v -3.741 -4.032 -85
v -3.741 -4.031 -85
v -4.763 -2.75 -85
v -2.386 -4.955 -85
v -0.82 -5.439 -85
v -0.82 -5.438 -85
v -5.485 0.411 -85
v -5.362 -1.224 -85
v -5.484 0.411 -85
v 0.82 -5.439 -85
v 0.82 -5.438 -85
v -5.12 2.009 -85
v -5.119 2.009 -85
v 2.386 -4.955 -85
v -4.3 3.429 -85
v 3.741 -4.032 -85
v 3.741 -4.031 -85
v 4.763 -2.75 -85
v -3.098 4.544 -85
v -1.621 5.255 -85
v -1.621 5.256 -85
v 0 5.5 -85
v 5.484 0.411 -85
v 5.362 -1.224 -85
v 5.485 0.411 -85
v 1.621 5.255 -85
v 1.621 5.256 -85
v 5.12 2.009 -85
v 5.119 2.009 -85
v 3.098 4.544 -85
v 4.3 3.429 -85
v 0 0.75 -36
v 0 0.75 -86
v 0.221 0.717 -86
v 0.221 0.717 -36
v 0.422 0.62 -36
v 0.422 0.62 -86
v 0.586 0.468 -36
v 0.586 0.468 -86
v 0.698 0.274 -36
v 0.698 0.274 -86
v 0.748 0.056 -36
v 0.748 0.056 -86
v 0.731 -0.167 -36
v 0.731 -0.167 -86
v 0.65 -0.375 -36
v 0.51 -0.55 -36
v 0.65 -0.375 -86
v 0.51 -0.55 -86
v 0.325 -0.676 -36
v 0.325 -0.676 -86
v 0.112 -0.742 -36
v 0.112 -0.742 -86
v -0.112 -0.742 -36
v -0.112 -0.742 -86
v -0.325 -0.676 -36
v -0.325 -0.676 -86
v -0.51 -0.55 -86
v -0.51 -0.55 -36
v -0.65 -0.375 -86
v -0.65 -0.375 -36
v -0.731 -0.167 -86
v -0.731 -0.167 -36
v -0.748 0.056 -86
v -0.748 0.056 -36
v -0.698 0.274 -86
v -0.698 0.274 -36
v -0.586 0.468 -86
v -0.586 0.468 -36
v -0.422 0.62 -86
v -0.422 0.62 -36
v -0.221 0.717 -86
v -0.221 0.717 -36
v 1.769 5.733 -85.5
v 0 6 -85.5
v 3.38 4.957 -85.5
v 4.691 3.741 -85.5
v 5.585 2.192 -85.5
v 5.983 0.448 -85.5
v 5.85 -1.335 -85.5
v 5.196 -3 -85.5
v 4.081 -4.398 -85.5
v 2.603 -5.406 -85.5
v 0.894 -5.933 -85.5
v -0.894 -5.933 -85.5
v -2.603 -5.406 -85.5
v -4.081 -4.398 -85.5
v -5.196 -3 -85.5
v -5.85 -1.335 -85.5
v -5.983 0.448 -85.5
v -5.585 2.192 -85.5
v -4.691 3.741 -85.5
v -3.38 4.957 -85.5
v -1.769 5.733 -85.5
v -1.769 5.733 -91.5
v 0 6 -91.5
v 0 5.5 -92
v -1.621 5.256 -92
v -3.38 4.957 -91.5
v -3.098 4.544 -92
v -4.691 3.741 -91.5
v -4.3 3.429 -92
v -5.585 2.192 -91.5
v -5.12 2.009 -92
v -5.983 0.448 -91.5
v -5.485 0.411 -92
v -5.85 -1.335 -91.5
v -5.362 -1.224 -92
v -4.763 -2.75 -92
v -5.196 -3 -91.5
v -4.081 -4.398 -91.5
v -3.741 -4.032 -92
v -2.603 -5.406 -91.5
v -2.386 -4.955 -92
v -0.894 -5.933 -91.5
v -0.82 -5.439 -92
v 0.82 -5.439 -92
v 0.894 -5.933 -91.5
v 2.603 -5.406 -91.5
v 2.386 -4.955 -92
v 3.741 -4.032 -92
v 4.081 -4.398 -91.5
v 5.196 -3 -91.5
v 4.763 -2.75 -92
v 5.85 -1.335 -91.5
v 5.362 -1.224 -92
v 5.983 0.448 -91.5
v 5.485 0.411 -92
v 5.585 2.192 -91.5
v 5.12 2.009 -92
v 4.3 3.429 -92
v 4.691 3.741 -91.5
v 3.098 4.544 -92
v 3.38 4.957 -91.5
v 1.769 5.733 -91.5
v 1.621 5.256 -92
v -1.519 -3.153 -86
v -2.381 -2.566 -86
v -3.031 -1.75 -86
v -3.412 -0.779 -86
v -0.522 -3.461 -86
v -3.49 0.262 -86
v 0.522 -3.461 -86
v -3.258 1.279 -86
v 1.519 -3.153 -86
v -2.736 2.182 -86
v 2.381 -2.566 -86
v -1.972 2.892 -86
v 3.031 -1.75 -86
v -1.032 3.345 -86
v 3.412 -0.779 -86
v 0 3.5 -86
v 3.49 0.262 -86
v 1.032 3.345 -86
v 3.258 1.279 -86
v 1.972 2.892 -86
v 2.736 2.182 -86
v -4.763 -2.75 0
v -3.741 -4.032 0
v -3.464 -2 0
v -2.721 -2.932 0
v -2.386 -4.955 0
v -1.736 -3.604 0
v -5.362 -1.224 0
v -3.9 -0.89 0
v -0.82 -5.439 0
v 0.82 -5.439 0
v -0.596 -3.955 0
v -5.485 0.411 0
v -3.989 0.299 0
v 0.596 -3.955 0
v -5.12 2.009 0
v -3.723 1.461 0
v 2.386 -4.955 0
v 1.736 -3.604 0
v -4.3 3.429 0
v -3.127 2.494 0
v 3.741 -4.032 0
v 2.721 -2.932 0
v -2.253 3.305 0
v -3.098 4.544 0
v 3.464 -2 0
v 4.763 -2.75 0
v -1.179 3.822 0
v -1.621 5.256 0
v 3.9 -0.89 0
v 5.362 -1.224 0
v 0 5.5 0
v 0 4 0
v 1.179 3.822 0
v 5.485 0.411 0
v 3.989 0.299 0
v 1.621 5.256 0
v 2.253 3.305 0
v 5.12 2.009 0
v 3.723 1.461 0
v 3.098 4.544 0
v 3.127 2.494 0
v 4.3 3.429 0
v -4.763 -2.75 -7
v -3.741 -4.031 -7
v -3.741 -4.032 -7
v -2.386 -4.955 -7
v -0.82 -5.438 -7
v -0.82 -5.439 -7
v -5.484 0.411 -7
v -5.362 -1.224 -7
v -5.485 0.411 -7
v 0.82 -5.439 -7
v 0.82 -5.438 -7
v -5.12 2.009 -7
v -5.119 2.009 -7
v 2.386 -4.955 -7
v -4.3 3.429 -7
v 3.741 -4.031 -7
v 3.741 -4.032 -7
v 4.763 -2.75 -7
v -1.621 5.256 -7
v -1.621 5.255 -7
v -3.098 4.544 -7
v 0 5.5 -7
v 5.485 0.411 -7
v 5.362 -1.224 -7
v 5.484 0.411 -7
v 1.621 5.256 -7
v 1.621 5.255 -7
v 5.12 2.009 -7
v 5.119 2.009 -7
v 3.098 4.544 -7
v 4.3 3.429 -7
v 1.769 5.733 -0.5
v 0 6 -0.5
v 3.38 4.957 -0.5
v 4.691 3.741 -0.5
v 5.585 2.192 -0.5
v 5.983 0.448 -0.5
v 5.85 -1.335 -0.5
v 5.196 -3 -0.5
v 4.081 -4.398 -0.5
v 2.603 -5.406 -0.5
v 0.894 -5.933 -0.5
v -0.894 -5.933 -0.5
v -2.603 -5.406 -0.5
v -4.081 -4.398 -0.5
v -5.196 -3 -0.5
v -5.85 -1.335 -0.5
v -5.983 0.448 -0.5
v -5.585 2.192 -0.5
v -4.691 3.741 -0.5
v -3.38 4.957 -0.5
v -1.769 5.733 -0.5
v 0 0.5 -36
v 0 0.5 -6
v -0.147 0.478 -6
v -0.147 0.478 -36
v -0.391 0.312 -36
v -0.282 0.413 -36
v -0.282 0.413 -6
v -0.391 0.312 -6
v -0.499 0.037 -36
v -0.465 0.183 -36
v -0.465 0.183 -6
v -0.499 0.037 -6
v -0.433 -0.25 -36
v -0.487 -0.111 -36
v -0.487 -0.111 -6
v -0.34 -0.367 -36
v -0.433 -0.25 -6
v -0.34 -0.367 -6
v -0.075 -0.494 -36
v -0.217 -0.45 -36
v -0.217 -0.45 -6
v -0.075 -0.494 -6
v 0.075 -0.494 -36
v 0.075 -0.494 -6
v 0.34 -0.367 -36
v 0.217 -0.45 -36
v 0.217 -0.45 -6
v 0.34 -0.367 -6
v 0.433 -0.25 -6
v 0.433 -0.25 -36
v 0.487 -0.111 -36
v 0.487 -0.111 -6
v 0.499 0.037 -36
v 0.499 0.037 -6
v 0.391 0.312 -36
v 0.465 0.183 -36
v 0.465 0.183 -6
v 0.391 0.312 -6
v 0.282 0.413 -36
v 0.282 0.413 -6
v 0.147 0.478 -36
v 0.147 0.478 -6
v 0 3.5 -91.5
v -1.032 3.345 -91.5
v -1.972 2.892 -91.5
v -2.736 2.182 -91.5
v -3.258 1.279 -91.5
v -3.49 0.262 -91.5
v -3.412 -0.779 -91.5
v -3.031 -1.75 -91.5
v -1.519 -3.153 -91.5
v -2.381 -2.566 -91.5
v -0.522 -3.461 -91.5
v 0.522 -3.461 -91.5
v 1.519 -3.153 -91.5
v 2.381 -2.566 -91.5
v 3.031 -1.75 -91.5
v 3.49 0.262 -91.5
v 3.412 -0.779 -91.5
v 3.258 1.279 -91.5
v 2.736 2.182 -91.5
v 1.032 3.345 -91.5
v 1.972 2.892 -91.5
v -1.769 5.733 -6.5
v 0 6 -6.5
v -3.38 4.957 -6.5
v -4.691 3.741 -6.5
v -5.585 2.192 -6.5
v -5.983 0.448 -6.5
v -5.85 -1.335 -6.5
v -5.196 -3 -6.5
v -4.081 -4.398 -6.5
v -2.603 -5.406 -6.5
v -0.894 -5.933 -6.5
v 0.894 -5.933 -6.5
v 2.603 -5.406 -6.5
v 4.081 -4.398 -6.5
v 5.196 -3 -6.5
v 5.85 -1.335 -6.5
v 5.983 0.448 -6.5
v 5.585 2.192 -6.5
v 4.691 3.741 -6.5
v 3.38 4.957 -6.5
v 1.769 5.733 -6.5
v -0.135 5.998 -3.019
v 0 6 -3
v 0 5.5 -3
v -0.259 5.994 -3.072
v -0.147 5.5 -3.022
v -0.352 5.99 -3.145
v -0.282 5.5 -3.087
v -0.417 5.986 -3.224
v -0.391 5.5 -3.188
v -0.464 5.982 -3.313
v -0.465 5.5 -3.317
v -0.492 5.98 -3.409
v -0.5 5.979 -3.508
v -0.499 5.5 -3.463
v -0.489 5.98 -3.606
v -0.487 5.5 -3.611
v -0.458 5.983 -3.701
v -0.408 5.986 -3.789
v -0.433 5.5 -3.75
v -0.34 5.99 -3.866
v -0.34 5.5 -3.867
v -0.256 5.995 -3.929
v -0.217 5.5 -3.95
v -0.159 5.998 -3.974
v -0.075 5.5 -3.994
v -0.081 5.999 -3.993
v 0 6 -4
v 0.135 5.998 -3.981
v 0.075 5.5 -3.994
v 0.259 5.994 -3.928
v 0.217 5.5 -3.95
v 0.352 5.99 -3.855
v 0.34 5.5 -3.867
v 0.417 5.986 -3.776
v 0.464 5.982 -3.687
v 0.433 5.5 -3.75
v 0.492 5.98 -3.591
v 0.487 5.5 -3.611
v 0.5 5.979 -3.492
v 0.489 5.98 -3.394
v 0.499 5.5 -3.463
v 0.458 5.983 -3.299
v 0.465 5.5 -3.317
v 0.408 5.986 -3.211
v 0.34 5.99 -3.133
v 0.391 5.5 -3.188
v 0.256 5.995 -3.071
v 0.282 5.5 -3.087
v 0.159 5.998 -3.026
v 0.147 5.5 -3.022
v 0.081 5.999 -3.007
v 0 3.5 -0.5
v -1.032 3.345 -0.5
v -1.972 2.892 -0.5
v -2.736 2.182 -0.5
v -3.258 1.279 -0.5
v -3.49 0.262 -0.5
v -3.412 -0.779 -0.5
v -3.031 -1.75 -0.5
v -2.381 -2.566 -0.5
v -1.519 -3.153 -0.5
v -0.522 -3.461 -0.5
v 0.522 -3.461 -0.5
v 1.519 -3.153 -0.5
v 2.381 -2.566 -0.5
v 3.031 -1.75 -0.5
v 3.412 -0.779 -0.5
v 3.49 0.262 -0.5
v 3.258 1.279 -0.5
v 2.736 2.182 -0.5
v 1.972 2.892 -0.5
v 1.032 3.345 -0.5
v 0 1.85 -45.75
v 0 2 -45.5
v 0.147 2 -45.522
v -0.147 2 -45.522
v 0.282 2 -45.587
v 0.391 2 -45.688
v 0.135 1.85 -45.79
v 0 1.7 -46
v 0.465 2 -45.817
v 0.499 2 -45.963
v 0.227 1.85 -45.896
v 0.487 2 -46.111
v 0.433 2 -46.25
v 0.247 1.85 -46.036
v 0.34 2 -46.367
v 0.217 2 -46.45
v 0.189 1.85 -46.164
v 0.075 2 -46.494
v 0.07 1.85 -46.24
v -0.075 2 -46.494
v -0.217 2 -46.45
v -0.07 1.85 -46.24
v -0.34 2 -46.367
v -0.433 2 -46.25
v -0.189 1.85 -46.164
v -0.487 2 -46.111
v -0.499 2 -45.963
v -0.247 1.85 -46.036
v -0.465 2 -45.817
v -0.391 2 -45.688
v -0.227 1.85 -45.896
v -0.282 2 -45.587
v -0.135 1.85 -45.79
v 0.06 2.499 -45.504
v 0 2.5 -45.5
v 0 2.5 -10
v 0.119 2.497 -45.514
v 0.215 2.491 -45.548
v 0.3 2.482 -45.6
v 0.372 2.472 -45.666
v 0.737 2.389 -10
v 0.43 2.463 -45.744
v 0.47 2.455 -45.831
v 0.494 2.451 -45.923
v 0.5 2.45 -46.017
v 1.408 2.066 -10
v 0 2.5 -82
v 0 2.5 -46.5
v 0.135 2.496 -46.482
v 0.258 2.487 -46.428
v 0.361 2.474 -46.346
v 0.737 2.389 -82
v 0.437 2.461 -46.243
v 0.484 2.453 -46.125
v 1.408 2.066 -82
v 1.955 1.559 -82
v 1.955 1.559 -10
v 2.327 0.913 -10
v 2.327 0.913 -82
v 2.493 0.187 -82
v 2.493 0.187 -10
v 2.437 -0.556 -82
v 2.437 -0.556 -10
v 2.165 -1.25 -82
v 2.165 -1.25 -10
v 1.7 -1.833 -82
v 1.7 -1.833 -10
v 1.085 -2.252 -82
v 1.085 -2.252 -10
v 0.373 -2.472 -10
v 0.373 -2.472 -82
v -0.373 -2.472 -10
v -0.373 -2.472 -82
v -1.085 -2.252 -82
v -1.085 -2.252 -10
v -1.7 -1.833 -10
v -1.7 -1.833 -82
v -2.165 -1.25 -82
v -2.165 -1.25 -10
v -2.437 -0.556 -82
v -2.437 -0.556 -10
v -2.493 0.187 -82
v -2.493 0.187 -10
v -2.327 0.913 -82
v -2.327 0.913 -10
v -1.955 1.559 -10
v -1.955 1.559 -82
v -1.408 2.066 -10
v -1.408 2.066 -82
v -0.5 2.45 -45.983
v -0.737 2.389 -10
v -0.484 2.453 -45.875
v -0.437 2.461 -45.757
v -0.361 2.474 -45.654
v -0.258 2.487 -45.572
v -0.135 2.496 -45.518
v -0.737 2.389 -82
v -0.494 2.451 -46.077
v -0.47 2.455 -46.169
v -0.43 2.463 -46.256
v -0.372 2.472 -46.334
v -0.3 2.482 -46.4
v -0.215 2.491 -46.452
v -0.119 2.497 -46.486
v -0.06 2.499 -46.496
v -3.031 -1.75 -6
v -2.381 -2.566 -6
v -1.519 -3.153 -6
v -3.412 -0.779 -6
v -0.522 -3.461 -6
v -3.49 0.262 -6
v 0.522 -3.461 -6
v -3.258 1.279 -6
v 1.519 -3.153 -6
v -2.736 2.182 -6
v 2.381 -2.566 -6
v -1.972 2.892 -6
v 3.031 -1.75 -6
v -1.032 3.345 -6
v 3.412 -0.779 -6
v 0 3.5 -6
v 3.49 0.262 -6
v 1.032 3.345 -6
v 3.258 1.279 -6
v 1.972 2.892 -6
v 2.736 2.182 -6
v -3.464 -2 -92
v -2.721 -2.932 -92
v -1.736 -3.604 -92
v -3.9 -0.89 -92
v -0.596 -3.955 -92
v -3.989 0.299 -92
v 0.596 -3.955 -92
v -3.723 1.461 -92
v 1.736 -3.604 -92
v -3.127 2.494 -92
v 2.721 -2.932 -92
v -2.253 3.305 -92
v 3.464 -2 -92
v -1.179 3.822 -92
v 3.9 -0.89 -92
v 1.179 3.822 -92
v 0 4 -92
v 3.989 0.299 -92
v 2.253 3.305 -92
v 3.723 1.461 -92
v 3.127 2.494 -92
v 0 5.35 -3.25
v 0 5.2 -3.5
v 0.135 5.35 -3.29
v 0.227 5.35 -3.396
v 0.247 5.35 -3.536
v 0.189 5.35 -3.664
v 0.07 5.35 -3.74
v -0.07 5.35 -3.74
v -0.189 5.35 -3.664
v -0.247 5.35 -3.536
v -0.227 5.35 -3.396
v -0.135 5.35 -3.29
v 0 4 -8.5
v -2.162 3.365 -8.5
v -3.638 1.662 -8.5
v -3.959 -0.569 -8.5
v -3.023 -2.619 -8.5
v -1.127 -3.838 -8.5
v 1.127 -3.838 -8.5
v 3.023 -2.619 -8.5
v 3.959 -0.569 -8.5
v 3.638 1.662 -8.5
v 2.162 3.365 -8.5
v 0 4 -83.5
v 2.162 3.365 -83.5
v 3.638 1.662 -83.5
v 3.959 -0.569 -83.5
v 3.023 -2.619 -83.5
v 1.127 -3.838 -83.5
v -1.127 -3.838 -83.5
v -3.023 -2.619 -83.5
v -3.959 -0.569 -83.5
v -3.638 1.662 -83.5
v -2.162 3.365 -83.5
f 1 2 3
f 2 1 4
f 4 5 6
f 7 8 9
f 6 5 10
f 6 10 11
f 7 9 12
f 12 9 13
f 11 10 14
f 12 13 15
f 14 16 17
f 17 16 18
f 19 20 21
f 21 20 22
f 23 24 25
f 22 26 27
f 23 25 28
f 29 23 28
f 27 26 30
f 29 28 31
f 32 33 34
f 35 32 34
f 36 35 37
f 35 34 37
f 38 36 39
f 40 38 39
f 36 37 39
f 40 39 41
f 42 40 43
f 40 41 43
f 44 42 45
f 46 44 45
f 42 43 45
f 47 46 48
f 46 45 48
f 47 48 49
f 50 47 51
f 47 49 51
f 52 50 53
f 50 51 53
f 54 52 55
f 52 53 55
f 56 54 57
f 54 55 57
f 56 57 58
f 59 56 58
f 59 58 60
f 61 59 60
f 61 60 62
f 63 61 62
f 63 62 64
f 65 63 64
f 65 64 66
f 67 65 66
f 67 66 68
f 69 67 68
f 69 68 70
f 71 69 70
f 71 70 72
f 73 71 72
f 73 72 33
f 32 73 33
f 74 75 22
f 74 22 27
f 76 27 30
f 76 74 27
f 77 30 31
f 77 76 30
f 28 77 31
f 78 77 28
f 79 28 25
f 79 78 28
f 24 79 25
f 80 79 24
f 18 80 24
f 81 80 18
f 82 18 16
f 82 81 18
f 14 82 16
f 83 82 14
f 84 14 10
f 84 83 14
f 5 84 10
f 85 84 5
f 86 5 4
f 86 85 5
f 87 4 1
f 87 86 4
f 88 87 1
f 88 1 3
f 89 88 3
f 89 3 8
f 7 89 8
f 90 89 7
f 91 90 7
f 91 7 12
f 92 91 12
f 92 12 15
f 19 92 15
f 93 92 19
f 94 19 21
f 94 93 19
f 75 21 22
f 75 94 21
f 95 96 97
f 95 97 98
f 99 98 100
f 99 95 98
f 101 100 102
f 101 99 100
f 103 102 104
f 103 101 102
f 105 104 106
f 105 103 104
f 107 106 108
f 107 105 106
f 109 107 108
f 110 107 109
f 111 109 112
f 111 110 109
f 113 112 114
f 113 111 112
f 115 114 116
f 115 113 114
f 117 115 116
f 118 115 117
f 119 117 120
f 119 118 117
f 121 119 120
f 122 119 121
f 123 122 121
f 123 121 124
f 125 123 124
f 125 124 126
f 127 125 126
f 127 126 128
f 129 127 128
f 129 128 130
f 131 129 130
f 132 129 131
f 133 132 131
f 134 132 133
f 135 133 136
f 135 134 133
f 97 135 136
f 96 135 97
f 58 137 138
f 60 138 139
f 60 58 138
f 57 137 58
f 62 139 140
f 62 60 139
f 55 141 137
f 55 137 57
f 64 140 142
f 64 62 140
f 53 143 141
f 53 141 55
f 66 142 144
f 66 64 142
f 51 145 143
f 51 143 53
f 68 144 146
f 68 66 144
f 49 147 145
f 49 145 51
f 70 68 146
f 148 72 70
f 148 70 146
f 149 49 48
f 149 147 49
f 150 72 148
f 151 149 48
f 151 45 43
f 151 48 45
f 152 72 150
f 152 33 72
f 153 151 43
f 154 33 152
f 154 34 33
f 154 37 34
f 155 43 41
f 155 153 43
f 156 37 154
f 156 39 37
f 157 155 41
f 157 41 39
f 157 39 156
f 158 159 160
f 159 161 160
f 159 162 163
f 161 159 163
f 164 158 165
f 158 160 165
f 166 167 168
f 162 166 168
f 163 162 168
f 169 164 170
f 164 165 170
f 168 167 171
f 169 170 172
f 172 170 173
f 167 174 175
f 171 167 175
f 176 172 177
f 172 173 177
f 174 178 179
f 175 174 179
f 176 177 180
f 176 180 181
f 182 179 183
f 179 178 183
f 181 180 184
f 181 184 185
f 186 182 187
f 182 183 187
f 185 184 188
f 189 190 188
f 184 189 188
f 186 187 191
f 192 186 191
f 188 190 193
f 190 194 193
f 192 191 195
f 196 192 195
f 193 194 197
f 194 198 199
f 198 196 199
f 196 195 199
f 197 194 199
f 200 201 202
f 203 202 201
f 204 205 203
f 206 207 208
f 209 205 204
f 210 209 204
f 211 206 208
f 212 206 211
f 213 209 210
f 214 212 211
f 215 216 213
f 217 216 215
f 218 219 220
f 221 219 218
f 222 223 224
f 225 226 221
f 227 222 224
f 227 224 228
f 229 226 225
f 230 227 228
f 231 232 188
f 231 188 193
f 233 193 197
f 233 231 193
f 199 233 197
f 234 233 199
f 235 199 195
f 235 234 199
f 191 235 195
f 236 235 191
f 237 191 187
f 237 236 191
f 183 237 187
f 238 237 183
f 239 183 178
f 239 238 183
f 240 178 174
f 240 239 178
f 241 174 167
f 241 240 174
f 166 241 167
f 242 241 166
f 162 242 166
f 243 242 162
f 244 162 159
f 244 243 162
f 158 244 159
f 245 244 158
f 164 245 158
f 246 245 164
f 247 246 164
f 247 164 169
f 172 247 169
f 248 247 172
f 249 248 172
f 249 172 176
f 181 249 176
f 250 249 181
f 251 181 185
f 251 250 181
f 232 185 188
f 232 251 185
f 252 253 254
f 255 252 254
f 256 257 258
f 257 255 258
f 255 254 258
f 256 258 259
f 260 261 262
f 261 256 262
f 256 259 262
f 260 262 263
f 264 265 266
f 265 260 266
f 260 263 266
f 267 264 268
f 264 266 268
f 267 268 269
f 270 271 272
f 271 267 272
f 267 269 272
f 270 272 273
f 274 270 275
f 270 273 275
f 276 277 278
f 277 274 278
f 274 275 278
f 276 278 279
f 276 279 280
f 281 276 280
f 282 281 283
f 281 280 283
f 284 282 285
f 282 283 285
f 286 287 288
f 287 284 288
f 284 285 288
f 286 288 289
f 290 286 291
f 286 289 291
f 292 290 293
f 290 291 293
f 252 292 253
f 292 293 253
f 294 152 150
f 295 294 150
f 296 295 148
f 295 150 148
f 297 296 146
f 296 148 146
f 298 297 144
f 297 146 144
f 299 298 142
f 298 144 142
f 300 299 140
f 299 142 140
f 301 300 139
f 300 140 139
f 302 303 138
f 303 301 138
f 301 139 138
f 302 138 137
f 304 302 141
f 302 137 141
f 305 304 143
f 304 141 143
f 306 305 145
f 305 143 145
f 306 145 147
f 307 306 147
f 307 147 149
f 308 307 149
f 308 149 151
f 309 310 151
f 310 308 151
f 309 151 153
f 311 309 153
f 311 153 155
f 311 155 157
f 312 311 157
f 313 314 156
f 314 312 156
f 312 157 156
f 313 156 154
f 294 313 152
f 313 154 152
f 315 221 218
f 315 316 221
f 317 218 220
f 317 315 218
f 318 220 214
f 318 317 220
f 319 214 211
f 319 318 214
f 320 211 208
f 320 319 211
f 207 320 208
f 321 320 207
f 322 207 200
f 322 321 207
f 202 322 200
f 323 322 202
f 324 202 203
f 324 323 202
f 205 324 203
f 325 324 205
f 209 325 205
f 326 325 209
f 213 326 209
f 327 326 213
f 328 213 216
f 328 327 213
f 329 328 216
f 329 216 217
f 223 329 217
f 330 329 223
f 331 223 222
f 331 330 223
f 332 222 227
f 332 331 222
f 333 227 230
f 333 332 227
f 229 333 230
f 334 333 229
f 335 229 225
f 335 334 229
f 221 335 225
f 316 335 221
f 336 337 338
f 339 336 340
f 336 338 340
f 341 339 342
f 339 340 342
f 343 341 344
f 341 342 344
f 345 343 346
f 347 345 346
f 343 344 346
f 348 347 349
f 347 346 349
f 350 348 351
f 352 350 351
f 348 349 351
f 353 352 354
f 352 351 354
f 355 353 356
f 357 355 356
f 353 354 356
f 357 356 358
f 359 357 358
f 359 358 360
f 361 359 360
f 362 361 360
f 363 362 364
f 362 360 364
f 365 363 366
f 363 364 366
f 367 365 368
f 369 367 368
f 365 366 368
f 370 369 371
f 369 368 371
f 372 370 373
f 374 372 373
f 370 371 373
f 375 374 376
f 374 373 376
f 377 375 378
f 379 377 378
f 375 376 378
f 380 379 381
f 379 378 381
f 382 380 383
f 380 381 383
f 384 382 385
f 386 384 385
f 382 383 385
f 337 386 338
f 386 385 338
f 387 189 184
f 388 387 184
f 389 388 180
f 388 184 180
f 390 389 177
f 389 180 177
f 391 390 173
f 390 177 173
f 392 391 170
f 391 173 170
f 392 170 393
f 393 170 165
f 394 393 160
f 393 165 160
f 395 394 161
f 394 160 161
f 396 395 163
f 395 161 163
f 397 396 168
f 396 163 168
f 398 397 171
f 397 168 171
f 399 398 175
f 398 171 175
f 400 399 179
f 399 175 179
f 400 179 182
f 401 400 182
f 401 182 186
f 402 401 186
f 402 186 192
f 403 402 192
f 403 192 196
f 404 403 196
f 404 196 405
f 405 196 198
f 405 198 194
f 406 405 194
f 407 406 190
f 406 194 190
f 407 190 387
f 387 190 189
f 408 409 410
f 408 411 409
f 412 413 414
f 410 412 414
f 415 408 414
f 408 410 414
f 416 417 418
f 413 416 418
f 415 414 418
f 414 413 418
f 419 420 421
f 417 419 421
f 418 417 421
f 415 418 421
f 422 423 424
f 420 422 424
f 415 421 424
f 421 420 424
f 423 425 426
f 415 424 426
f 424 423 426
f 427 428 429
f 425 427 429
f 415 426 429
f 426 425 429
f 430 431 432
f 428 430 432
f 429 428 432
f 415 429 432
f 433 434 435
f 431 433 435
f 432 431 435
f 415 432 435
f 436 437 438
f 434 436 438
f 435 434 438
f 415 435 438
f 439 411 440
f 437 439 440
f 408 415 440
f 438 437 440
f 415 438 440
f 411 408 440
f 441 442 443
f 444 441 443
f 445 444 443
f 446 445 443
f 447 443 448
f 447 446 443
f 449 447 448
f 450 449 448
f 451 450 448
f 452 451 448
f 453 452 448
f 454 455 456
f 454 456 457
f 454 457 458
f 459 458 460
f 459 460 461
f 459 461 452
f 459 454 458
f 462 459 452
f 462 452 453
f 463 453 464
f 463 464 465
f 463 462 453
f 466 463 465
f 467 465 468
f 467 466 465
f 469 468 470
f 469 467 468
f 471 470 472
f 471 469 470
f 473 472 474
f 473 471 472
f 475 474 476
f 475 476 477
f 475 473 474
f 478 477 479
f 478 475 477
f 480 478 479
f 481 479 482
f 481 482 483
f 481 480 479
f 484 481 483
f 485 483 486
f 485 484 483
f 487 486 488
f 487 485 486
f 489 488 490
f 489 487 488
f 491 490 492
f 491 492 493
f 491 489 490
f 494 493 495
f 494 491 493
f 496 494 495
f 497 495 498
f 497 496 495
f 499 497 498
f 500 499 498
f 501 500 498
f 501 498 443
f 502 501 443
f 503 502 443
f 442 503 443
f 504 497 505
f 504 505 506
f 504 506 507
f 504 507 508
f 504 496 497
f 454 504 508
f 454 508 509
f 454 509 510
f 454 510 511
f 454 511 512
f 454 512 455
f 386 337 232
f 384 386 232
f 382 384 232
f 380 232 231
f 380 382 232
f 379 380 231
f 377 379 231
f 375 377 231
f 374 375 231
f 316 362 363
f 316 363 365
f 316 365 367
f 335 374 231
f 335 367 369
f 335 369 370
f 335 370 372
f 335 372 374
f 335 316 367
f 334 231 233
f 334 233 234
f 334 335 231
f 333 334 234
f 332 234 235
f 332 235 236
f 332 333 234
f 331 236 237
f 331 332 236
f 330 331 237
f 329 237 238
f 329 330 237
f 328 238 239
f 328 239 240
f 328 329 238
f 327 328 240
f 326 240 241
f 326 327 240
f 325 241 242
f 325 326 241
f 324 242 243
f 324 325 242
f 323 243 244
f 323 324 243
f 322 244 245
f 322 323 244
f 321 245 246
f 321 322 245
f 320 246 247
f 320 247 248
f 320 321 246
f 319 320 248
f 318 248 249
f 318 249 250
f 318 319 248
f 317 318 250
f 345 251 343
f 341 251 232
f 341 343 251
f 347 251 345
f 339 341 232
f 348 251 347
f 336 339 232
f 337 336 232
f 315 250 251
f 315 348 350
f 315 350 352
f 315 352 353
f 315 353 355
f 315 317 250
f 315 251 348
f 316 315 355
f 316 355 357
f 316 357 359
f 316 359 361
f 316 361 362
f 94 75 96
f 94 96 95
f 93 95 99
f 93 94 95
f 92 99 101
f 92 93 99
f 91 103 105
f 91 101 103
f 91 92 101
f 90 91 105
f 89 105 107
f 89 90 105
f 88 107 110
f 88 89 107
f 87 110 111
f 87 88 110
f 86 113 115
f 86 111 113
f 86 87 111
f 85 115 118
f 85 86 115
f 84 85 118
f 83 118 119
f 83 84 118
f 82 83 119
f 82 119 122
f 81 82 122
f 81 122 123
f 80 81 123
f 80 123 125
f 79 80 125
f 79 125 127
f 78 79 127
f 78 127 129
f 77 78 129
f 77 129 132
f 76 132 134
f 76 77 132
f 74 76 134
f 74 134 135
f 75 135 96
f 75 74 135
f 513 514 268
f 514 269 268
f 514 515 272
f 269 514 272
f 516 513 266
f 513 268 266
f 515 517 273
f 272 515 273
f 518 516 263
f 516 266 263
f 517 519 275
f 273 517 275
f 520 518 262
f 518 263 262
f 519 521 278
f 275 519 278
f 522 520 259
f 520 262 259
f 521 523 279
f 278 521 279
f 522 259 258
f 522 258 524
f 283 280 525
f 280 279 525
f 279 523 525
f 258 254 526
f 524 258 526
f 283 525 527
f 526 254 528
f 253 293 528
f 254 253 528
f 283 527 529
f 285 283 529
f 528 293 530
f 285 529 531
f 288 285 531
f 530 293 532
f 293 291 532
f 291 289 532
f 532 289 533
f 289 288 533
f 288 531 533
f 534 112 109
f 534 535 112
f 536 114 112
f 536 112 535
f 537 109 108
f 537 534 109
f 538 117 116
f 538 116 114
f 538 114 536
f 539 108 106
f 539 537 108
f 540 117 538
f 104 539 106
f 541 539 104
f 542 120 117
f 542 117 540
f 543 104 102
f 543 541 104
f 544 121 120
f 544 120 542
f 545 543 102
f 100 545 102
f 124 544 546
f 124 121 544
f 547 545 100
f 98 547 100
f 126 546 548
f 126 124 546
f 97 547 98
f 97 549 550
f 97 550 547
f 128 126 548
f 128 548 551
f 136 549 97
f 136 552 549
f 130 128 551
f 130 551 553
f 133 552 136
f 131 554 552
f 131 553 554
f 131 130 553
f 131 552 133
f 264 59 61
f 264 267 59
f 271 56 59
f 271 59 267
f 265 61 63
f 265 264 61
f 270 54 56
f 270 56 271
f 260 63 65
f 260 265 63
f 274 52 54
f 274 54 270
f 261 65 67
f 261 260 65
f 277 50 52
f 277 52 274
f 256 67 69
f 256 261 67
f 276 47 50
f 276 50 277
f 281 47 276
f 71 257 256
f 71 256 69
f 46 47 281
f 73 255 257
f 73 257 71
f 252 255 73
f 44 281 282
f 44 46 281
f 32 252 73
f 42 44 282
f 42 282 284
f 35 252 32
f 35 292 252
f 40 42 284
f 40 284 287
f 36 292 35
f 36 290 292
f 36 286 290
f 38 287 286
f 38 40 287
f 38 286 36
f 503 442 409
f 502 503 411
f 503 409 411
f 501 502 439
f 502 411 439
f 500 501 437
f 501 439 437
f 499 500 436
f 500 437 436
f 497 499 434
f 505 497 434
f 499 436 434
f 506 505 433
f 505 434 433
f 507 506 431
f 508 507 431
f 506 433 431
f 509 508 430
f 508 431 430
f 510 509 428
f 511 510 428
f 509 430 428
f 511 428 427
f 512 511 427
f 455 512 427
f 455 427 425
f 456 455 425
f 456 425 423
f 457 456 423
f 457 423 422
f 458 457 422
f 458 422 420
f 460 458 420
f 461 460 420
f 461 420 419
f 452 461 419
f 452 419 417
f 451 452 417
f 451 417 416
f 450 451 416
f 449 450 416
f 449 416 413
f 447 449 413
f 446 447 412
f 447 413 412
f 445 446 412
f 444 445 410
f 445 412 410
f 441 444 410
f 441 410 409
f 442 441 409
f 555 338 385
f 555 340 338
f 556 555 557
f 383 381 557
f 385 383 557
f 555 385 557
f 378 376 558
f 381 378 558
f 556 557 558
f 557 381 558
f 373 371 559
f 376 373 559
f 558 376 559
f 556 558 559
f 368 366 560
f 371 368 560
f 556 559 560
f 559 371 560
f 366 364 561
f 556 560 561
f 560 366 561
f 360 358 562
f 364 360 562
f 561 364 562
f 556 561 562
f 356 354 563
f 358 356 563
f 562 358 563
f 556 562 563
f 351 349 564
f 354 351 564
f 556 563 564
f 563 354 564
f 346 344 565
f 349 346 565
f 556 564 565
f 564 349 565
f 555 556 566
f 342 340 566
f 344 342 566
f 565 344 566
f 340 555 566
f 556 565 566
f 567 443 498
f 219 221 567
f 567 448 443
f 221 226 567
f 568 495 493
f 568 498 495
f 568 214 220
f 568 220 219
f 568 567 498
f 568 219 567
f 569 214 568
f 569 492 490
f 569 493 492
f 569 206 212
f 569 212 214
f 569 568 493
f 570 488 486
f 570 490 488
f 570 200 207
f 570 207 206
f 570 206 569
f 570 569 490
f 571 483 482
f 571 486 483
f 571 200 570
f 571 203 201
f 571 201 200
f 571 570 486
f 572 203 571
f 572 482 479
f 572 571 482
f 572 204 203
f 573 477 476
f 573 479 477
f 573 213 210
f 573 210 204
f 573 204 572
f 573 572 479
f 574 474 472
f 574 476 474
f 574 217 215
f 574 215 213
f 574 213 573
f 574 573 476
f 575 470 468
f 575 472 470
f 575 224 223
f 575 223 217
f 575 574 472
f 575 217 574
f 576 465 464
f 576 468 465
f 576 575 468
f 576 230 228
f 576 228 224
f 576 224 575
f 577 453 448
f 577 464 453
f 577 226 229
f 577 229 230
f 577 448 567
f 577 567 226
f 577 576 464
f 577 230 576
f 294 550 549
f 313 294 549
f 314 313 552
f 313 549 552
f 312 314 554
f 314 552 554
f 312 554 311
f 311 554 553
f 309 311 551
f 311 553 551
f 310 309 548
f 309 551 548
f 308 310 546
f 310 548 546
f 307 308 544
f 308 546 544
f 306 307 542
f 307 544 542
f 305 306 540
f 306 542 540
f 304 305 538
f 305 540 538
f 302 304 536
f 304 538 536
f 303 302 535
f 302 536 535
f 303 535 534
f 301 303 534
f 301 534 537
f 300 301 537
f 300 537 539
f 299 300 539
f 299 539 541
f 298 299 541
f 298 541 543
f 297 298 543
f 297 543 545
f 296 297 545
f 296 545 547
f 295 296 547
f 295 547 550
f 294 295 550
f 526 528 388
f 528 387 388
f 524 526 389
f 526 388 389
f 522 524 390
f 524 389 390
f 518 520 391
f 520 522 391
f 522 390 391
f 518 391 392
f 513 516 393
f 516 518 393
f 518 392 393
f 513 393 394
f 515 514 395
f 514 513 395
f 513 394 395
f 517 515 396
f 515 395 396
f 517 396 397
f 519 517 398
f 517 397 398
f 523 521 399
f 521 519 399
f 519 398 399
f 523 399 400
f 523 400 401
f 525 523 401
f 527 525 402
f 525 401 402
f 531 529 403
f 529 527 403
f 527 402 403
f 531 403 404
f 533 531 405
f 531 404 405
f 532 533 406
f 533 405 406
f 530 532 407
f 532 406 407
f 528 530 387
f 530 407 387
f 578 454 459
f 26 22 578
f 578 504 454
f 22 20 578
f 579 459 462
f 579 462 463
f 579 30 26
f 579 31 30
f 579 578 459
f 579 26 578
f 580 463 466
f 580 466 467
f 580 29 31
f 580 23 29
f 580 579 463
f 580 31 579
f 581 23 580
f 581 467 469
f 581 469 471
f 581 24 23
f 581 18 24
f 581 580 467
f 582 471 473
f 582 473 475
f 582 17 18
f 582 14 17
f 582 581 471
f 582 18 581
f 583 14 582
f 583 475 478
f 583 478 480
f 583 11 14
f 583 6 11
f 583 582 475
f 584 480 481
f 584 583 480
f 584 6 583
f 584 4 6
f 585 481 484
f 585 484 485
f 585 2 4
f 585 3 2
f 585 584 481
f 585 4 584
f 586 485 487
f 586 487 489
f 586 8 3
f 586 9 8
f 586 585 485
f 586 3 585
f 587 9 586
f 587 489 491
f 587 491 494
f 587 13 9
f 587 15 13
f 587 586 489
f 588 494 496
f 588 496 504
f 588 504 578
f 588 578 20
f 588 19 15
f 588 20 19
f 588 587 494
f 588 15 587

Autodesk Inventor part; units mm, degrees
ref_plane "YZ Plane" through (0, 0, 0) normal (1, 0, 0) x (0, 1, 0)
sketch "Sketch1" plane through (0, 0, 0) normal (1, 0, 0) x (0, 1, 0)
  line L0 (0, 0) -> (0, -92)
  line L1 (0, -92) -> (3.5, -92)
  line L2 (3.5, -92) -> (3.5, 0)
  line L3 (3.5, 0) -> (0, 0)
  line L4 (3.5, 0) -> (3.5, -6)
  line L5 (3.5, -92) -> (3.5, -86)
  line L6 (3.5, -92) -> (6, -92)
  line L7 (6, -92) -> (6, -86)
  line L8 (6, -86) -> (3.5, -86)
  line L9 (3.5, 0) -> (6, 0)
  line L10 (6, 0) -> (6, -6)
  line L11 (6, -6) -> (3.5, -6)
  line L12 (3.5, -86) -> (0.5, -86)
  line L13 (0.5, -86) -> (0.5, -6)
  line L14 (0.5, -6) -> (3.5, -6)
  line L15 (6, -6) -> (6, -7)
  line L16 (6, -7) -> (0.5, -7)
  line L17 (6, -86) -> (6, -85)
  line L18 (6, -85) -> (0.5, -85)
  line L19 (3.5, -7) -> (3.6267, -7)
  line L20 (2.5, -7) -> (2.5, -85)
  line L21 (0.5, -6) -> (0.5, -36)
  line L22 (0.5, -36) -> (0.75, -36)
  line L23 (0.75, -36) -> (0.75, -86)
  line L24 (0.75, -86) -> (0, -86)
  point P0 (3.5, -85)
  point P1 (2, -6)
  point P2 (3.6267, -85)
  dimension "d0" = 92
  dimension "d1" = 3.5
  dimension "d2" = 6
  dimension "d3" = 6
  dimension "d5" = 2.5
  dimension "d6" = 2.5
  dimension "d7" = 3
  dimension "d8" = 1
  dimension "d9" = 1
  dimension "d22" = 2
  dimension "d41" = 30
  dimension "d42" = 0.25
  dimension "d43" = 50
revolve "Revolution1" add sketch "Sketch1" angle 360 about axis through (0, 0, 0) along (0, 0, -1) contours L9 L10 L11 L2 | L11 L15 L16 L2 | L2 L16 L13 L14 | L2 L8 L7 L6 | L23 L18 L2 L12 | L2 L18 L17 L8 | L23 L22 L13 L16 L20 L18
thread "Thread1" size "M7x1" class "6H" standard "ANSI Metric M Profile" full length
thread "Thread2" size "M7x1" class "6H" standard "ANSI Metric M Profile" full length
chamfer "Chamfer1" distance 0.5 angle 45 2 edges at (0, -3.5, 0) (0, -3.5, -92)
chamfer "Chamfer2" distance 0.5 angle 45 4 edges at (0, -6, -92) (0, -6, -85) (0, -6, -7) (0, -6, 0)
chamfer "Chamfer3" distance 3 angle 45 2 edges at (0, -2.5, -7) (0, -2.5, -85)
ref_plane "Work Plane1" through (0, 6, -3.5) normal (0, 1, 0) x (-1, 0, 0)
ref_plane "Work Plane2" through (0, 2.5, -46) normal (0, 1, 0) x (-1, 0, 0)
sketch "Sketch2" plane through (0, 6, -3.5) normal (0, 1, 0) x (-1, 0, 0)
  point P0 (0, 3.5)
  point P1 (0, 0)
  point P2 (0, 0)
sketch "Sketch3" plane through (0, 2.5, -46) normal (0, 1, 0) x (-1, 0, 0)
  point P0 (0, 46)
  point P1 (0, 0)
hole "Hole1" at (0, 6, -3.5) direction (0, -1, 0) diameter 1 depth 0.5 tip angle 118
hole "Hole2" at (0, 2.5, -46) direction (0, -1, 0) diameter 1 depth 0.5 tip angle 118
properties part number "Heater"
